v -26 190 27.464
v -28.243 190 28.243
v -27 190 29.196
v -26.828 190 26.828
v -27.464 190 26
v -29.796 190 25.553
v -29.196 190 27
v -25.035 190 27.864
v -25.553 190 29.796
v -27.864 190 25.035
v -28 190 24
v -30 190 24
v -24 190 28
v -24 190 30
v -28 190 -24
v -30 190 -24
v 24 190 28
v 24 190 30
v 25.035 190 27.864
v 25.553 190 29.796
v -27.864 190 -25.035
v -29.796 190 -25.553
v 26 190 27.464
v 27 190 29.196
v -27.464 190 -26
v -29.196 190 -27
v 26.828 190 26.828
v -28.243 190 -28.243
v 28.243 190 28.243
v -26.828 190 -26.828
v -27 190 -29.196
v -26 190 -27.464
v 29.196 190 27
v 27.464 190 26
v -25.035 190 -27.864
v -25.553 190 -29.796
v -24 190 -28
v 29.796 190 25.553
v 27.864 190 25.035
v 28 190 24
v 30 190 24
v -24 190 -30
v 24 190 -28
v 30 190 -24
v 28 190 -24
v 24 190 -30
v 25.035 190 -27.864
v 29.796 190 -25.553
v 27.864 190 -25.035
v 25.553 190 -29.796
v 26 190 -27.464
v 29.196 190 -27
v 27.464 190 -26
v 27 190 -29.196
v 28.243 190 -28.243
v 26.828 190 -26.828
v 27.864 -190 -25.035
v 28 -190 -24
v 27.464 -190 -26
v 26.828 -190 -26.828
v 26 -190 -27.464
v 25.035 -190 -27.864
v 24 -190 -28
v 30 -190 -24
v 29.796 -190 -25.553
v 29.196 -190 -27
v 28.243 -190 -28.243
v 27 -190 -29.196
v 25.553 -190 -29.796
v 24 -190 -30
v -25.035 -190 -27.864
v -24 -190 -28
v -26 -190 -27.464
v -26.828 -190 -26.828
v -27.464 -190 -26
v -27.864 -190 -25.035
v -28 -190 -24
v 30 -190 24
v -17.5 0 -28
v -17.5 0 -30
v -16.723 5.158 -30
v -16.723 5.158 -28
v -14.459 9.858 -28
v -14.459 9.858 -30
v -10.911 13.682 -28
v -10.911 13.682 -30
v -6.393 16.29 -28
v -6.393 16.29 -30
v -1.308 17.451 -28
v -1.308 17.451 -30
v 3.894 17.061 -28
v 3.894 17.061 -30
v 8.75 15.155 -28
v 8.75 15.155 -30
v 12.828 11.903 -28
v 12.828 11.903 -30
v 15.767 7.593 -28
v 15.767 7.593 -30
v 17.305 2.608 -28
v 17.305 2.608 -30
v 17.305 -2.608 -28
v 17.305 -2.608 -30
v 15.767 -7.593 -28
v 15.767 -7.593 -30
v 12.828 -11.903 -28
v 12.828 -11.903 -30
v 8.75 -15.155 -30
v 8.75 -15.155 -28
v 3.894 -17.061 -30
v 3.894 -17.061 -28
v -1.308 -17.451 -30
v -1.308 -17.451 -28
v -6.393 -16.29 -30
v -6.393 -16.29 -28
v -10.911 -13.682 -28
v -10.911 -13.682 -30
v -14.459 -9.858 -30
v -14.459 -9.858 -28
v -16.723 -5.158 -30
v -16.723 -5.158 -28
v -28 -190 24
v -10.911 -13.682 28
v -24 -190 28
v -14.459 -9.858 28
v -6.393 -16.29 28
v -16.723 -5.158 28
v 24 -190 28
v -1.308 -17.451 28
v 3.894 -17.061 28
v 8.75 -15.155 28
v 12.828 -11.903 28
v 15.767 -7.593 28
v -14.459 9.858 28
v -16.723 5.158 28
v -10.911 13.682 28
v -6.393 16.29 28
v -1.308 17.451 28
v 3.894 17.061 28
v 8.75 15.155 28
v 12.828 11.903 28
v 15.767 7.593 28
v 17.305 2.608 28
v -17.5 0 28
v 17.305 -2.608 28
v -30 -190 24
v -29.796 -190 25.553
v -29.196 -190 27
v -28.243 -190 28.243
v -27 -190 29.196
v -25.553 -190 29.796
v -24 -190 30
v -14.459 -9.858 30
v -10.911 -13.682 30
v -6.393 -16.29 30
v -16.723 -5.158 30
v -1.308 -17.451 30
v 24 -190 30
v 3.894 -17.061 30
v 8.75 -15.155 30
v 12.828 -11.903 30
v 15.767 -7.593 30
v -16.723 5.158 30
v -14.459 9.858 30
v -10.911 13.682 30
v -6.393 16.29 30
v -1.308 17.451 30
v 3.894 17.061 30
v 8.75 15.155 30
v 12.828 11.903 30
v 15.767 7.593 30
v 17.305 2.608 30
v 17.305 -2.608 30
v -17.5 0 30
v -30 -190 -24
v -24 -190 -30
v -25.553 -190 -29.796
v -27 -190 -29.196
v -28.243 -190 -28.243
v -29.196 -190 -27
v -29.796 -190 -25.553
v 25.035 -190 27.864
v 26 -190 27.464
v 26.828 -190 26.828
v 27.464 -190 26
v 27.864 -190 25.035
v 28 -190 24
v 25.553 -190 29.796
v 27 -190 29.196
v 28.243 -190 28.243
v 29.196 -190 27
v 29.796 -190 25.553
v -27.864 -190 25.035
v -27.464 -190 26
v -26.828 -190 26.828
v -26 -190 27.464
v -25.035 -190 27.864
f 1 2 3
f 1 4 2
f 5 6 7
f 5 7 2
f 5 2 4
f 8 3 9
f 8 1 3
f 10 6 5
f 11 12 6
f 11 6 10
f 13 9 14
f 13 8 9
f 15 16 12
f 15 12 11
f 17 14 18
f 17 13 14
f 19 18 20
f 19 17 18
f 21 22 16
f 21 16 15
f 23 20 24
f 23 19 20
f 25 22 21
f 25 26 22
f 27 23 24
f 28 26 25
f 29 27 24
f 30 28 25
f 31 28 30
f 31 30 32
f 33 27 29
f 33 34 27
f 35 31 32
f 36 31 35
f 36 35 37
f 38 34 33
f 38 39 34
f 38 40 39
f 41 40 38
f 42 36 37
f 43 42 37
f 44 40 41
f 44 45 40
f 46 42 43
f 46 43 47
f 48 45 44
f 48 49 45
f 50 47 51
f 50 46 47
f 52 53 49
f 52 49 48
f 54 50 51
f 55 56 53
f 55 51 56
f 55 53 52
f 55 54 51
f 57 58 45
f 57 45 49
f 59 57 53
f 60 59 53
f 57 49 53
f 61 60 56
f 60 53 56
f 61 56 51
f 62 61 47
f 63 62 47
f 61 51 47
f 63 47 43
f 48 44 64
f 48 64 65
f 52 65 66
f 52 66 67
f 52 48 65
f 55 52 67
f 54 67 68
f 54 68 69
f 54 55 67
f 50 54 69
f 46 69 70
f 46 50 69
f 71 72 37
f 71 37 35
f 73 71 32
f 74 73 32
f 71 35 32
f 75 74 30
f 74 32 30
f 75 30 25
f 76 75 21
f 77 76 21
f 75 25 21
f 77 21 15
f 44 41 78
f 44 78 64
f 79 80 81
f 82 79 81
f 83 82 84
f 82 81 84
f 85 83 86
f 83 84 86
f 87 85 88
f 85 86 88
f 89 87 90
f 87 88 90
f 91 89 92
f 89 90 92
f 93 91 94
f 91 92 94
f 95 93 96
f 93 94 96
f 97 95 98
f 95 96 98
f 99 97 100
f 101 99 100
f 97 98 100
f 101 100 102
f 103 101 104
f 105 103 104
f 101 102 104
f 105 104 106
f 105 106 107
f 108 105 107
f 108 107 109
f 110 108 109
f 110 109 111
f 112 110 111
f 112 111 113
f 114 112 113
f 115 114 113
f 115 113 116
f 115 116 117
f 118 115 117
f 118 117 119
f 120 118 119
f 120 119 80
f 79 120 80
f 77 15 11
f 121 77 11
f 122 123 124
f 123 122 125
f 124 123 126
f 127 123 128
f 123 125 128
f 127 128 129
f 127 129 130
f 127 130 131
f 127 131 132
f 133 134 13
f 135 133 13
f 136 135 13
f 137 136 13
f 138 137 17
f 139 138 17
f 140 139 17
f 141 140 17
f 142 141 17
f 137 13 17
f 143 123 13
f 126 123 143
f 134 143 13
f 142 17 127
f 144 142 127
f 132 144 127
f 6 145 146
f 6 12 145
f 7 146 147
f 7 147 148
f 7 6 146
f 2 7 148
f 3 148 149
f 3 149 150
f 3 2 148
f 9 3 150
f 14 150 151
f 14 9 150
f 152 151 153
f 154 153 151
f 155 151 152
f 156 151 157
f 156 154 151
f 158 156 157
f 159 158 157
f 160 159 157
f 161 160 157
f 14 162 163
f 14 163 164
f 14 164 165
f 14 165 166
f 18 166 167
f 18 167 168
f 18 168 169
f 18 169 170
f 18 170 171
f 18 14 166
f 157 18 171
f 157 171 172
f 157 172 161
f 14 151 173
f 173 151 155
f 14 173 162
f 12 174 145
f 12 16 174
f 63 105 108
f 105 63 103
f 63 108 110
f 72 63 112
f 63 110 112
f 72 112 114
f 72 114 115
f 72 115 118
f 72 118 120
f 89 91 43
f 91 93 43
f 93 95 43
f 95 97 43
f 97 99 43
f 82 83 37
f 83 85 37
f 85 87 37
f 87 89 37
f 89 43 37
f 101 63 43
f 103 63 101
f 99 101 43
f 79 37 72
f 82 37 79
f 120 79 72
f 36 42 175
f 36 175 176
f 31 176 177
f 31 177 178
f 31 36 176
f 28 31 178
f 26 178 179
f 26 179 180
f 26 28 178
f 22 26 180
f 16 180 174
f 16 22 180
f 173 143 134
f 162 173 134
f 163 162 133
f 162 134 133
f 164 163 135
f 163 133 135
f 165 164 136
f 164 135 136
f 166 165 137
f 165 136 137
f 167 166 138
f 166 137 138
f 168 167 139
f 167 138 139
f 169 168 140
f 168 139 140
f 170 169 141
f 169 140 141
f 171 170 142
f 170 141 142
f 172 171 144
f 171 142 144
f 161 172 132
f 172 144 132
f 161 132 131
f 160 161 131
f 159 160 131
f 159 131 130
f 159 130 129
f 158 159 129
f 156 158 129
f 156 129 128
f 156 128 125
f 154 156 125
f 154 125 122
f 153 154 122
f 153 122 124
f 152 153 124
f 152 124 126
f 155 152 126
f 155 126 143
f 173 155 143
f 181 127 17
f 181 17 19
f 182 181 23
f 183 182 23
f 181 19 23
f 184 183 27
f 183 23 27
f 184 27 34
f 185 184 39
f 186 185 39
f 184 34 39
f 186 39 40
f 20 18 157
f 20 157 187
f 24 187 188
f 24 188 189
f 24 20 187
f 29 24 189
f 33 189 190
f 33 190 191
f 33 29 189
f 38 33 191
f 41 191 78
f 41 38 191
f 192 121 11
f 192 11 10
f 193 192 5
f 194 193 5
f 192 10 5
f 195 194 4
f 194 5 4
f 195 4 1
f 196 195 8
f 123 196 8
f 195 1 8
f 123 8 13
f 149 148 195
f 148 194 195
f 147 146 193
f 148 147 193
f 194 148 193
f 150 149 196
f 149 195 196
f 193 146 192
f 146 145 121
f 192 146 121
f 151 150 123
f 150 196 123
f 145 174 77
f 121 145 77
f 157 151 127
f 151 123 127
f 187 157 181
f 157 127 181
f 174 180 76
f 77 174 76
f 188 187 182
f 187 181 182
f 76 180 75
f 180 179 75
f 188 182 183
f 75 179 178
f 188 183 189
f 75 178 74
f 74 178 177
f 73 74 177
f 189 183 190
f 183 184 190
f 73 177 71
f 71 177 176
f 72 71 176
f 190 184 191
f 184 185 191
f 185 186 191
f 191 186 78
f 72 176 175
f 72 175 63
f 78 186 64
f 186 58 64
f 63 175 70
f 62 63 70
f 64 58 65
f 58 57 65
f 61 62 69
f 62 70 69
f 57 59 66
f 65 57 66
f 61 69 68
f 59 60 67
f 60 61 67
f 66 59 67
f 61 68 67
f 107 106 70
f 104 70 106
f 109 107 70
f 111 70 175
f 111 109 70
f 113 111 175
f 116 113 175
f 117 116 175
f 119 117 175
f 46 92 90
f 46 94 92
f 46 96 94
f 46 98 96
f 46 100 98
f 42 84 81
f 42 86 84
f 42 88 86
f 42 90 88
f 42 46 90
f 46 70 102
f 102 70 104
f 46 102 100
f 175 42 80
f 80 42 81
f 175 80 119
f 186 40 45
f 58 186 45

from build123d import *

# Parameters (mm, degrees)
BOSS_EXTRUDE1_DEPTH = 190
SHELL1_T            = -2
SKETCH3_R           = 17.5
CUT_EXTRUDE2_DEPTH  = 61


with BuildPart() as part:
    # Sketch1 → Boss-Extrude1 (new body, symmetric)
    with BuildSketch(Plane(origin=(0, 0, 0), x_dir=(1, 0, 0), z_dir=(0, 1, 0))):
        with BuildLine():
            Line((-24, -30), (24, -30))
            ThreePointArc((24, -30), (28.242640687, -28.242640687), (30, -24))
            Line((30, -24), (30, 24))
            ThreePointArc((30, 24), (28.242640687, 28.242640687), (24, 30))
            Line((24, 30), (-24, 30))
            ThreePointArc((-24, 30), (-28.242640687, 28.242640687), (-30, 24))
            Line((-30, 24), (-30, -24))
            ThreePointArc((-30, -24), (-28.242640687, -28.242640687), (-24, -30))
        make_face()
    extrude(amount=BOSS_EXTRUDE1_DEPTH, both=True)

    # Shell1
    shell1_openings = [part.faces().sort_by_distance(p)[0] for p in [
        (0, 190, 0),
        (0, -190, 0),
    ]]
    offset(amount=SHELL1_T, openings=shell1_openings, kind=Kind.INTERSECTION)

    # Sketch3 → Cut-Extrude2 (cut, through all)
    with BuildSketch(Plane(origin=(0, 0, -30), x_dir=(-1, 0, 0), z_dir=(0, 0, -1))):
        Circle(SKETCH3_R)
    extrude(amount=-CUT_EXTRUDE2_DEPTH, mode=Mode.SUBTRACT)


solid = part.part
